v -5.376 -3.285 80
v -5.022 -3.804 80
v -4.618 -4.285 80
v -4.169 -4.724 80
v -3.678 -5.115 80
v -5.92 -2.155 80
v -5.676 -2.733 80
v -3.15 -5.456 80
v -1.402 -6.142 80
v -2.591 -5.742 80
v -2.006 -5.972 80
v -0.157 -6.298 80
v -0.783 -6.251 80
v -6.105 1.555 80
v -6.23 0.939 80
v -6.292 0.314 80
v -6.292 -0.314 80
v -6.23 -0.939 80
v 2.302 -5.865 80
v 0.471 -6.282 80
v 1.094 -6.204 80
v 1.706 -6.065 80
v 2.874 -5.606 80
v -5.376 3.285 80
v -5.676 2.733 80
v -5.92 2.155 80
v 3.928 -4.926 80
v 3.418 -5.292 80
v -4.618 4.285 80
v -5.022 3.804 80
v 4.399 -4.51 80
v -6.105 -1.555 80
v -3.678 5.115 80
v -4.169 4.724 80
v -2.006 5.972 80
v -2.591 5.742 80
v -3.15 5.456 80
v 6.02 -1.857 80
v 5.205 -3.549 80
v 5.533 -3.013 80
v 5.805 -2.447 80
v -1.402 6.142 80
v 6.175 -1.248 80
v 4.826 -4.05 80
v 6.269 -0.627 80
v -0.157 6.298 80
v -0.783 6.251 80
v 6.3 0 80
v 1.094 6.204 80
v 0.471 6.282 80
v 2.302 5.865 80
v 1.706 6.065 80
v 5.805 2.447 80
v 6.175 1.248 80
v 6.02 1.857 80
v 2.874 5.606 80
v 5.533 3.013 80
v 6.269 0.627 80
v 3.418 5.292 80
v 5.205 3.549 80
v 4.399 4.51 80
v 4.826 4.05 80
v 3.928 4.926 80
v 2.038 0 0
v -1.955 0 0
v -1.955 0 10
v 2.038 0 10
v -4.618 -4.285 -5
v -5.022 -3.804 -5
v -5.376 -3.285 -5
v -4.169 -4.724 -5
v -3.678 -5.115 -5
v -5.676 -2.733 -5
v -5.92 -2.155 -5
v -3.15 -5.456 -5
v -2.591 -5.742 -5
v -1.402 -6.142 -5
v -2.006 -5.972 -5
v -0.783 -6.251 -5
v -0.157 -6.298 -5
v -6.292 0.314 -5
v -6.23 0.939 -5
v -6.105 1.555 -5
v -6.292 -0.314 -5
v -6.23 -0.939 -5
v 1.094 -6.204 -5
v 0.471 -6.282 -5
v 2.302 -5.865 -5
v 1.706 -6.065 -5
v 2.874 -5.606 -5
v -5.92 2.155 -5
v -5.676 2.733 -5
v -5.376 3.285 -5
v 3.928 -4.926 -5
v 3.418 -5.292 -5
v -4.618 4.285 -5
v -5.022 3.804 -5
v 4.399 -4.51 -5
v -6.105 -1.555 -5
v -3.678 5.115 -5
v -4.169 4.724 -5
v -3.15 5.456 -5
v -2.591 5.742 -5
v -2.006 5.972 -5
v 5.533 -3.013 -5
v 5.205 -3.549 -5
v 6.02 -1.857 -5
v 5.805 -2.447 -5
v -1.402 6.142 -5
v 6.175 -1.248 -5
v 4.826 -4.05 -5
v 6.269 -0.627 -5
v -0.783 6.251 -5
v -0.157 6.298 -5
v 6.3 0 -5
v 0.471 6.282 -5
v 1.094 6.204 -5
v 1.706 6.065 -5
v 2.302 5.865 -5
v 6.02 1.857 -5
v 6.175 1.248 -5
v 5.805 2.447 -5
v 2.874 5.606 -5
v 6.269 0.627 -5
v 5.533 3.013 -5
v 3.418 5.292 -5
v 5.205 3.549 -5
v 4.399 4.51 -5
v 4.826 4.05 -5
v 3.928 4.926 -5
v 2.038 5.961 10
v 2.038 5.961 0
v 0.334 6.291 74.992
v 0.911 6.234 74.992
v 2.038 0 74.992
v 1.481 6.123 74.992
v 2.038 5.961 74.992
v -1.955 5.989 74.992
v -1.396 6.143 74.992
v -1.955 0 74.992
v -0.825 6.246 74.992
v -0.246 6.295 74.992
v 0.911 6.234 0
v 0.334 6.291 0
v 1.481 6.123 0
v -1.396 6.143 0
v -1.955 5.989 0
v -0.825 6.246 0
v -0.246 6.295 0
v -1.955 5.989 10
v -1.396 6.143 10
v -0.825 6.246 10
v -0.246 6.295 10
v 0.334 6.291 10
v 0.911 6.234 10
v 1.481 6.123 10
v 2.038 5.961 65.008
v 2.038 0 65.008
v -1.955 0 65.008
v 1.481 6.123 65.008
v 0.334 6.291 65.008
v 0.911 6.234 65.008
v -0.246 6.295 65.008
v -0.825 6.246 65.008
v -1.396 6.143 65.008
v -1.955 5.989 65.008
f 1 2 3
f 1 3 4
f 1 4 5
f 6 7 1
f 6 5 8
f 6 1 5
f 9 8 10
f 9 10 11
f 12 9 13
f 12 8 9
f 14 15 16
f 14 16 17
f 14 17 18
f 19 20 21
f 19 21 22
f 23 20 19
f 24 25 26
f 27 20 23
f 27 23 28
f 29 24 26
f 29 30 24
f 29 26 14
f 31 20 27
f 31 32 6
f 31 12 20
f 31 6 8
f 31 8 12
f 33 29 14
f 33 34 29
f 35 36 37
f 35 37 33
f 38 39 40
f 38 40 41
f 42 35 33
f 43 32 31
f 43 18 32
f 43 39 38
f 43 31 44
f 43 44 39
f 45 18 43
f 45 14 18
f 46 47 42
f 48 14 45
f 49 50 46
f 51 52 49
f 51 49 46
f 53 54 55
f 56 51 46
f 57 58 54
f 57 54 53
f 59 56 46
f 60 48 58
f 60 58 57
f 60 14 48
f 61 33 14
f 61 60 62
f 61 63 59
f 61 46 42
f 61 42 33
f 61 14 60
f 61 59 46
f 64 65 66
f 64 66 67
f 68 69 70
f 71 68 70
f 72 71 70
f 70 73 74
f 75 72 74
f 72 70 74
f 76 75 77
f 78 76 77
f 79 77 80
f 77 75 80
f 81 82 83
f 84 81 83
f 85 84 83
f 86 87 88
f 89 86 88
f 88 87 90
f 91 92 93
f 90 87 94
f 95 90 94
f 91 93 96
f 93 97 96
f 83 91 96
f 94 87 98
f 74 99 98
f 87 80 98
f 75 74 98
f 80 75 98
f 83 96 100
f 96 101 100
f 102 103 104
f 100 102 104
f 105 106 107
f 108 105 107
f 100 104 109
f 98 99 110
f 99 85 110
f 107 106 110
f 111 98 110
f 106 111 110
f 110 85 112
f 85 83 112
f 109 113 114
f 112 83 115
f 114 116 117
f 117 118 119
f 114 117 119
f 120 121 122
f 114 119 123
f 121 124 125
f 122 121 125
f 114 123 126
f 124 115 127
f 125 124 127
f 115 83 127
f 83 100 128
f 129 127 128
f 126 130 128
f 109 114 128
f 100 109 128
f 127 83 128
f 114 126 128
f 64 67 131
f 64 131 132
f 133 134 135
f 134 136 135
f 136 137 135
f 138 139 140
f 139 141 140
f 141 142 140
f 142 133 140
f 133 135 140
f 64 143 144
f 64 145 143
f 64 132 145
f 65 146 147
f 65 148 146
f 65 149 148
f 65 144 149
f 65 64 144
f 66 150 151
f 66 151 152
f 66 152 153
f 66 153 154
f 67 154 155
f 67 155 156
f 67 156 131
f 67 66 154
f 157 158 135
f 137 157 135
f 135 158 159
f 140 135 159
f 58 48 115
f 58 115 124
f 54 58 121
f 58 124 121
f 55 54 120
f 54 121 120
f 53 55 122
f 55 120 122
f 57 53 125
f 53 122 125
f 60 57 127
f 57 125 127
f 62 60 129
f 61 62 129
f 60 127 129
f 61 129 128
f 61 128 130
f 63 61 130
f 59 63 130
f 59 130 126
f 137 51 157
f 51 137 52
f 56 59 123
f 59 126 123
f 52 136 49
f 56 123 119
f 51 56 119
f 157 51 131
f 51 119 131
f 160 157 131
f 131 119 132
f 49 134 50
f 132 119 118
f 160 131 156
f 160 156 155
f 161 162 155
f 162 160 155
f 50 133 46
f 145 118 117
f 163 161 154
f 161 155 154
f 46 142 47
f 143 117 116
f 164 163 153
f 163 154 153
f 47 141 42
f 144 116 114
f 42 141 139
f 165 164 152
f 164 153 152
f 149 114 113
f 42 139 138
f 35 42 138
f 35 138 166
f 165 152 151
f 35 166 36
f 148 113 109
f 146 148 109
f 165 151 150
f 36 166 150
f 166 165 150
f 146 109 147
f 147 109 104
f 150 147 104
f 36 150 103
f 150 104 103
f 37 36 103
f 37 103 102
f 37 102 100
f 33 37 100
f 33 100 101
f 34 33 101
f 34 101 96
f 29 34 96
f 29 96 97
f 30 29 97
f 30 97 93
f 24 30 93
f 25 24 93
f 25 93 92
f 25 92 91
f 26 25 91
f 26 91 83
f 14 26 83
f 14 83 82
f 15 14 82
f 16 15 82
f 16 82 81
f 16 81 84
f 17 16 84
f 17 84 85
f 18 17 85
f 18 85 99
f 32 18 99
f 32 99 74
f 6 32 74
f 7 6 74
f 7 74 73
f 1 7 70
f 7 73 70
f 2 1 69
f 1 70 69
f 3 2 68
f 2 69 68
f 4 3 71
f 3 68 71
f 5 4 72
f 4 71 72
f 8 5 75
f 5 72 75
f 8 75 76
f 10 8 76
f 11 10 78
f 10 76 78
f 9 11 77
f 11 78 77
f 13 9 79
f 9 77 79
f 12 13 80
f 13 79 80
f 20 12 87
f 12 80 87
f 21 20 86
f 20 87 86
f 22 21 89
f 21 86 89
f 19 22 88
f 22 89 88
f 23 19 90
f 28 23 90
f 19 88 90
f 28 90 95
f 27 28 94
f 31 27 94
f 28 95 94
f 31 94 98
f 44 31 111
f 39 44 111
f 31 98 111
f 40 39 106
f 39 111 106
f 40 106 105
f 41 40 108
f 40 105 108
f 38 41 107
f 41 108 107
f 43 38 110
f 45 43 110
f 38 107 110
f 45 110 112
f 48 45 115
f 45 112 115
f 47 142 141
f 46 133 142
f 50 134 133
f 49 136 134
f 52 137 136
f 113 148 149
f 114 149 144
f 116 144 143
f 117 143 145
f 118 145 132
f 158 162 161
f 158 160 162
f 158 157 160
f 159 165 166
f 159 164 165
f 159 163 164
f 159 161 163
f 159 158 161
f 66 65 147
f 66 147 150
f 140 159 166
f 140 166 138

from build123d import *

# Parameters (mm, degrees)
BOSS_EXTRUDE1_DEPTH      = 80
BOSS_EXTRUDE1_DEPTH_BACK = 5
SKETCH1_R                = 6.3
CUT_EXTRUDE1_DEPTH       = 10


with BuildPart() as part:
    # Sketch1 → Boss-Extrude1 (new, two sides: drawn at the far end of the back side and taken through both)
    with BuildSketch(Plane.XY.offset(-BOSS_EXTRUDE1_DEPTH_BACK)):
        Circle(SKETCH1_R)
    extrude(amount=BOSS_EXTRUDE1_DEPTH + BOSS_EXTRUDE1_DEPTH_BACK)

    # Sketch6 → Cut-Extrude1 (cut)
    with BuildSketch(Plane(origin=(0, 0, 0), x_dir=(1, 0, 0), z_dir=(0, 1, 0))):
        Polygon((-1.955160092, -70), (-1.955160092, -65.008101893), (0, -65.008101893), (2.038358394, -65.008101893), (2.038358394, -74.991898107), (-1.955160092, -74.991898107), align=None)
        Polygon((0, 0), (-1.955160092, 0), (-1.955160092, -10), (2.038358394, -10), (2.038358394, 0), align=None)
    extrude(amount=CUT_EXTRUDE1_DEPTH, mode=Mode.SUBTRACT)


solid = part.part
